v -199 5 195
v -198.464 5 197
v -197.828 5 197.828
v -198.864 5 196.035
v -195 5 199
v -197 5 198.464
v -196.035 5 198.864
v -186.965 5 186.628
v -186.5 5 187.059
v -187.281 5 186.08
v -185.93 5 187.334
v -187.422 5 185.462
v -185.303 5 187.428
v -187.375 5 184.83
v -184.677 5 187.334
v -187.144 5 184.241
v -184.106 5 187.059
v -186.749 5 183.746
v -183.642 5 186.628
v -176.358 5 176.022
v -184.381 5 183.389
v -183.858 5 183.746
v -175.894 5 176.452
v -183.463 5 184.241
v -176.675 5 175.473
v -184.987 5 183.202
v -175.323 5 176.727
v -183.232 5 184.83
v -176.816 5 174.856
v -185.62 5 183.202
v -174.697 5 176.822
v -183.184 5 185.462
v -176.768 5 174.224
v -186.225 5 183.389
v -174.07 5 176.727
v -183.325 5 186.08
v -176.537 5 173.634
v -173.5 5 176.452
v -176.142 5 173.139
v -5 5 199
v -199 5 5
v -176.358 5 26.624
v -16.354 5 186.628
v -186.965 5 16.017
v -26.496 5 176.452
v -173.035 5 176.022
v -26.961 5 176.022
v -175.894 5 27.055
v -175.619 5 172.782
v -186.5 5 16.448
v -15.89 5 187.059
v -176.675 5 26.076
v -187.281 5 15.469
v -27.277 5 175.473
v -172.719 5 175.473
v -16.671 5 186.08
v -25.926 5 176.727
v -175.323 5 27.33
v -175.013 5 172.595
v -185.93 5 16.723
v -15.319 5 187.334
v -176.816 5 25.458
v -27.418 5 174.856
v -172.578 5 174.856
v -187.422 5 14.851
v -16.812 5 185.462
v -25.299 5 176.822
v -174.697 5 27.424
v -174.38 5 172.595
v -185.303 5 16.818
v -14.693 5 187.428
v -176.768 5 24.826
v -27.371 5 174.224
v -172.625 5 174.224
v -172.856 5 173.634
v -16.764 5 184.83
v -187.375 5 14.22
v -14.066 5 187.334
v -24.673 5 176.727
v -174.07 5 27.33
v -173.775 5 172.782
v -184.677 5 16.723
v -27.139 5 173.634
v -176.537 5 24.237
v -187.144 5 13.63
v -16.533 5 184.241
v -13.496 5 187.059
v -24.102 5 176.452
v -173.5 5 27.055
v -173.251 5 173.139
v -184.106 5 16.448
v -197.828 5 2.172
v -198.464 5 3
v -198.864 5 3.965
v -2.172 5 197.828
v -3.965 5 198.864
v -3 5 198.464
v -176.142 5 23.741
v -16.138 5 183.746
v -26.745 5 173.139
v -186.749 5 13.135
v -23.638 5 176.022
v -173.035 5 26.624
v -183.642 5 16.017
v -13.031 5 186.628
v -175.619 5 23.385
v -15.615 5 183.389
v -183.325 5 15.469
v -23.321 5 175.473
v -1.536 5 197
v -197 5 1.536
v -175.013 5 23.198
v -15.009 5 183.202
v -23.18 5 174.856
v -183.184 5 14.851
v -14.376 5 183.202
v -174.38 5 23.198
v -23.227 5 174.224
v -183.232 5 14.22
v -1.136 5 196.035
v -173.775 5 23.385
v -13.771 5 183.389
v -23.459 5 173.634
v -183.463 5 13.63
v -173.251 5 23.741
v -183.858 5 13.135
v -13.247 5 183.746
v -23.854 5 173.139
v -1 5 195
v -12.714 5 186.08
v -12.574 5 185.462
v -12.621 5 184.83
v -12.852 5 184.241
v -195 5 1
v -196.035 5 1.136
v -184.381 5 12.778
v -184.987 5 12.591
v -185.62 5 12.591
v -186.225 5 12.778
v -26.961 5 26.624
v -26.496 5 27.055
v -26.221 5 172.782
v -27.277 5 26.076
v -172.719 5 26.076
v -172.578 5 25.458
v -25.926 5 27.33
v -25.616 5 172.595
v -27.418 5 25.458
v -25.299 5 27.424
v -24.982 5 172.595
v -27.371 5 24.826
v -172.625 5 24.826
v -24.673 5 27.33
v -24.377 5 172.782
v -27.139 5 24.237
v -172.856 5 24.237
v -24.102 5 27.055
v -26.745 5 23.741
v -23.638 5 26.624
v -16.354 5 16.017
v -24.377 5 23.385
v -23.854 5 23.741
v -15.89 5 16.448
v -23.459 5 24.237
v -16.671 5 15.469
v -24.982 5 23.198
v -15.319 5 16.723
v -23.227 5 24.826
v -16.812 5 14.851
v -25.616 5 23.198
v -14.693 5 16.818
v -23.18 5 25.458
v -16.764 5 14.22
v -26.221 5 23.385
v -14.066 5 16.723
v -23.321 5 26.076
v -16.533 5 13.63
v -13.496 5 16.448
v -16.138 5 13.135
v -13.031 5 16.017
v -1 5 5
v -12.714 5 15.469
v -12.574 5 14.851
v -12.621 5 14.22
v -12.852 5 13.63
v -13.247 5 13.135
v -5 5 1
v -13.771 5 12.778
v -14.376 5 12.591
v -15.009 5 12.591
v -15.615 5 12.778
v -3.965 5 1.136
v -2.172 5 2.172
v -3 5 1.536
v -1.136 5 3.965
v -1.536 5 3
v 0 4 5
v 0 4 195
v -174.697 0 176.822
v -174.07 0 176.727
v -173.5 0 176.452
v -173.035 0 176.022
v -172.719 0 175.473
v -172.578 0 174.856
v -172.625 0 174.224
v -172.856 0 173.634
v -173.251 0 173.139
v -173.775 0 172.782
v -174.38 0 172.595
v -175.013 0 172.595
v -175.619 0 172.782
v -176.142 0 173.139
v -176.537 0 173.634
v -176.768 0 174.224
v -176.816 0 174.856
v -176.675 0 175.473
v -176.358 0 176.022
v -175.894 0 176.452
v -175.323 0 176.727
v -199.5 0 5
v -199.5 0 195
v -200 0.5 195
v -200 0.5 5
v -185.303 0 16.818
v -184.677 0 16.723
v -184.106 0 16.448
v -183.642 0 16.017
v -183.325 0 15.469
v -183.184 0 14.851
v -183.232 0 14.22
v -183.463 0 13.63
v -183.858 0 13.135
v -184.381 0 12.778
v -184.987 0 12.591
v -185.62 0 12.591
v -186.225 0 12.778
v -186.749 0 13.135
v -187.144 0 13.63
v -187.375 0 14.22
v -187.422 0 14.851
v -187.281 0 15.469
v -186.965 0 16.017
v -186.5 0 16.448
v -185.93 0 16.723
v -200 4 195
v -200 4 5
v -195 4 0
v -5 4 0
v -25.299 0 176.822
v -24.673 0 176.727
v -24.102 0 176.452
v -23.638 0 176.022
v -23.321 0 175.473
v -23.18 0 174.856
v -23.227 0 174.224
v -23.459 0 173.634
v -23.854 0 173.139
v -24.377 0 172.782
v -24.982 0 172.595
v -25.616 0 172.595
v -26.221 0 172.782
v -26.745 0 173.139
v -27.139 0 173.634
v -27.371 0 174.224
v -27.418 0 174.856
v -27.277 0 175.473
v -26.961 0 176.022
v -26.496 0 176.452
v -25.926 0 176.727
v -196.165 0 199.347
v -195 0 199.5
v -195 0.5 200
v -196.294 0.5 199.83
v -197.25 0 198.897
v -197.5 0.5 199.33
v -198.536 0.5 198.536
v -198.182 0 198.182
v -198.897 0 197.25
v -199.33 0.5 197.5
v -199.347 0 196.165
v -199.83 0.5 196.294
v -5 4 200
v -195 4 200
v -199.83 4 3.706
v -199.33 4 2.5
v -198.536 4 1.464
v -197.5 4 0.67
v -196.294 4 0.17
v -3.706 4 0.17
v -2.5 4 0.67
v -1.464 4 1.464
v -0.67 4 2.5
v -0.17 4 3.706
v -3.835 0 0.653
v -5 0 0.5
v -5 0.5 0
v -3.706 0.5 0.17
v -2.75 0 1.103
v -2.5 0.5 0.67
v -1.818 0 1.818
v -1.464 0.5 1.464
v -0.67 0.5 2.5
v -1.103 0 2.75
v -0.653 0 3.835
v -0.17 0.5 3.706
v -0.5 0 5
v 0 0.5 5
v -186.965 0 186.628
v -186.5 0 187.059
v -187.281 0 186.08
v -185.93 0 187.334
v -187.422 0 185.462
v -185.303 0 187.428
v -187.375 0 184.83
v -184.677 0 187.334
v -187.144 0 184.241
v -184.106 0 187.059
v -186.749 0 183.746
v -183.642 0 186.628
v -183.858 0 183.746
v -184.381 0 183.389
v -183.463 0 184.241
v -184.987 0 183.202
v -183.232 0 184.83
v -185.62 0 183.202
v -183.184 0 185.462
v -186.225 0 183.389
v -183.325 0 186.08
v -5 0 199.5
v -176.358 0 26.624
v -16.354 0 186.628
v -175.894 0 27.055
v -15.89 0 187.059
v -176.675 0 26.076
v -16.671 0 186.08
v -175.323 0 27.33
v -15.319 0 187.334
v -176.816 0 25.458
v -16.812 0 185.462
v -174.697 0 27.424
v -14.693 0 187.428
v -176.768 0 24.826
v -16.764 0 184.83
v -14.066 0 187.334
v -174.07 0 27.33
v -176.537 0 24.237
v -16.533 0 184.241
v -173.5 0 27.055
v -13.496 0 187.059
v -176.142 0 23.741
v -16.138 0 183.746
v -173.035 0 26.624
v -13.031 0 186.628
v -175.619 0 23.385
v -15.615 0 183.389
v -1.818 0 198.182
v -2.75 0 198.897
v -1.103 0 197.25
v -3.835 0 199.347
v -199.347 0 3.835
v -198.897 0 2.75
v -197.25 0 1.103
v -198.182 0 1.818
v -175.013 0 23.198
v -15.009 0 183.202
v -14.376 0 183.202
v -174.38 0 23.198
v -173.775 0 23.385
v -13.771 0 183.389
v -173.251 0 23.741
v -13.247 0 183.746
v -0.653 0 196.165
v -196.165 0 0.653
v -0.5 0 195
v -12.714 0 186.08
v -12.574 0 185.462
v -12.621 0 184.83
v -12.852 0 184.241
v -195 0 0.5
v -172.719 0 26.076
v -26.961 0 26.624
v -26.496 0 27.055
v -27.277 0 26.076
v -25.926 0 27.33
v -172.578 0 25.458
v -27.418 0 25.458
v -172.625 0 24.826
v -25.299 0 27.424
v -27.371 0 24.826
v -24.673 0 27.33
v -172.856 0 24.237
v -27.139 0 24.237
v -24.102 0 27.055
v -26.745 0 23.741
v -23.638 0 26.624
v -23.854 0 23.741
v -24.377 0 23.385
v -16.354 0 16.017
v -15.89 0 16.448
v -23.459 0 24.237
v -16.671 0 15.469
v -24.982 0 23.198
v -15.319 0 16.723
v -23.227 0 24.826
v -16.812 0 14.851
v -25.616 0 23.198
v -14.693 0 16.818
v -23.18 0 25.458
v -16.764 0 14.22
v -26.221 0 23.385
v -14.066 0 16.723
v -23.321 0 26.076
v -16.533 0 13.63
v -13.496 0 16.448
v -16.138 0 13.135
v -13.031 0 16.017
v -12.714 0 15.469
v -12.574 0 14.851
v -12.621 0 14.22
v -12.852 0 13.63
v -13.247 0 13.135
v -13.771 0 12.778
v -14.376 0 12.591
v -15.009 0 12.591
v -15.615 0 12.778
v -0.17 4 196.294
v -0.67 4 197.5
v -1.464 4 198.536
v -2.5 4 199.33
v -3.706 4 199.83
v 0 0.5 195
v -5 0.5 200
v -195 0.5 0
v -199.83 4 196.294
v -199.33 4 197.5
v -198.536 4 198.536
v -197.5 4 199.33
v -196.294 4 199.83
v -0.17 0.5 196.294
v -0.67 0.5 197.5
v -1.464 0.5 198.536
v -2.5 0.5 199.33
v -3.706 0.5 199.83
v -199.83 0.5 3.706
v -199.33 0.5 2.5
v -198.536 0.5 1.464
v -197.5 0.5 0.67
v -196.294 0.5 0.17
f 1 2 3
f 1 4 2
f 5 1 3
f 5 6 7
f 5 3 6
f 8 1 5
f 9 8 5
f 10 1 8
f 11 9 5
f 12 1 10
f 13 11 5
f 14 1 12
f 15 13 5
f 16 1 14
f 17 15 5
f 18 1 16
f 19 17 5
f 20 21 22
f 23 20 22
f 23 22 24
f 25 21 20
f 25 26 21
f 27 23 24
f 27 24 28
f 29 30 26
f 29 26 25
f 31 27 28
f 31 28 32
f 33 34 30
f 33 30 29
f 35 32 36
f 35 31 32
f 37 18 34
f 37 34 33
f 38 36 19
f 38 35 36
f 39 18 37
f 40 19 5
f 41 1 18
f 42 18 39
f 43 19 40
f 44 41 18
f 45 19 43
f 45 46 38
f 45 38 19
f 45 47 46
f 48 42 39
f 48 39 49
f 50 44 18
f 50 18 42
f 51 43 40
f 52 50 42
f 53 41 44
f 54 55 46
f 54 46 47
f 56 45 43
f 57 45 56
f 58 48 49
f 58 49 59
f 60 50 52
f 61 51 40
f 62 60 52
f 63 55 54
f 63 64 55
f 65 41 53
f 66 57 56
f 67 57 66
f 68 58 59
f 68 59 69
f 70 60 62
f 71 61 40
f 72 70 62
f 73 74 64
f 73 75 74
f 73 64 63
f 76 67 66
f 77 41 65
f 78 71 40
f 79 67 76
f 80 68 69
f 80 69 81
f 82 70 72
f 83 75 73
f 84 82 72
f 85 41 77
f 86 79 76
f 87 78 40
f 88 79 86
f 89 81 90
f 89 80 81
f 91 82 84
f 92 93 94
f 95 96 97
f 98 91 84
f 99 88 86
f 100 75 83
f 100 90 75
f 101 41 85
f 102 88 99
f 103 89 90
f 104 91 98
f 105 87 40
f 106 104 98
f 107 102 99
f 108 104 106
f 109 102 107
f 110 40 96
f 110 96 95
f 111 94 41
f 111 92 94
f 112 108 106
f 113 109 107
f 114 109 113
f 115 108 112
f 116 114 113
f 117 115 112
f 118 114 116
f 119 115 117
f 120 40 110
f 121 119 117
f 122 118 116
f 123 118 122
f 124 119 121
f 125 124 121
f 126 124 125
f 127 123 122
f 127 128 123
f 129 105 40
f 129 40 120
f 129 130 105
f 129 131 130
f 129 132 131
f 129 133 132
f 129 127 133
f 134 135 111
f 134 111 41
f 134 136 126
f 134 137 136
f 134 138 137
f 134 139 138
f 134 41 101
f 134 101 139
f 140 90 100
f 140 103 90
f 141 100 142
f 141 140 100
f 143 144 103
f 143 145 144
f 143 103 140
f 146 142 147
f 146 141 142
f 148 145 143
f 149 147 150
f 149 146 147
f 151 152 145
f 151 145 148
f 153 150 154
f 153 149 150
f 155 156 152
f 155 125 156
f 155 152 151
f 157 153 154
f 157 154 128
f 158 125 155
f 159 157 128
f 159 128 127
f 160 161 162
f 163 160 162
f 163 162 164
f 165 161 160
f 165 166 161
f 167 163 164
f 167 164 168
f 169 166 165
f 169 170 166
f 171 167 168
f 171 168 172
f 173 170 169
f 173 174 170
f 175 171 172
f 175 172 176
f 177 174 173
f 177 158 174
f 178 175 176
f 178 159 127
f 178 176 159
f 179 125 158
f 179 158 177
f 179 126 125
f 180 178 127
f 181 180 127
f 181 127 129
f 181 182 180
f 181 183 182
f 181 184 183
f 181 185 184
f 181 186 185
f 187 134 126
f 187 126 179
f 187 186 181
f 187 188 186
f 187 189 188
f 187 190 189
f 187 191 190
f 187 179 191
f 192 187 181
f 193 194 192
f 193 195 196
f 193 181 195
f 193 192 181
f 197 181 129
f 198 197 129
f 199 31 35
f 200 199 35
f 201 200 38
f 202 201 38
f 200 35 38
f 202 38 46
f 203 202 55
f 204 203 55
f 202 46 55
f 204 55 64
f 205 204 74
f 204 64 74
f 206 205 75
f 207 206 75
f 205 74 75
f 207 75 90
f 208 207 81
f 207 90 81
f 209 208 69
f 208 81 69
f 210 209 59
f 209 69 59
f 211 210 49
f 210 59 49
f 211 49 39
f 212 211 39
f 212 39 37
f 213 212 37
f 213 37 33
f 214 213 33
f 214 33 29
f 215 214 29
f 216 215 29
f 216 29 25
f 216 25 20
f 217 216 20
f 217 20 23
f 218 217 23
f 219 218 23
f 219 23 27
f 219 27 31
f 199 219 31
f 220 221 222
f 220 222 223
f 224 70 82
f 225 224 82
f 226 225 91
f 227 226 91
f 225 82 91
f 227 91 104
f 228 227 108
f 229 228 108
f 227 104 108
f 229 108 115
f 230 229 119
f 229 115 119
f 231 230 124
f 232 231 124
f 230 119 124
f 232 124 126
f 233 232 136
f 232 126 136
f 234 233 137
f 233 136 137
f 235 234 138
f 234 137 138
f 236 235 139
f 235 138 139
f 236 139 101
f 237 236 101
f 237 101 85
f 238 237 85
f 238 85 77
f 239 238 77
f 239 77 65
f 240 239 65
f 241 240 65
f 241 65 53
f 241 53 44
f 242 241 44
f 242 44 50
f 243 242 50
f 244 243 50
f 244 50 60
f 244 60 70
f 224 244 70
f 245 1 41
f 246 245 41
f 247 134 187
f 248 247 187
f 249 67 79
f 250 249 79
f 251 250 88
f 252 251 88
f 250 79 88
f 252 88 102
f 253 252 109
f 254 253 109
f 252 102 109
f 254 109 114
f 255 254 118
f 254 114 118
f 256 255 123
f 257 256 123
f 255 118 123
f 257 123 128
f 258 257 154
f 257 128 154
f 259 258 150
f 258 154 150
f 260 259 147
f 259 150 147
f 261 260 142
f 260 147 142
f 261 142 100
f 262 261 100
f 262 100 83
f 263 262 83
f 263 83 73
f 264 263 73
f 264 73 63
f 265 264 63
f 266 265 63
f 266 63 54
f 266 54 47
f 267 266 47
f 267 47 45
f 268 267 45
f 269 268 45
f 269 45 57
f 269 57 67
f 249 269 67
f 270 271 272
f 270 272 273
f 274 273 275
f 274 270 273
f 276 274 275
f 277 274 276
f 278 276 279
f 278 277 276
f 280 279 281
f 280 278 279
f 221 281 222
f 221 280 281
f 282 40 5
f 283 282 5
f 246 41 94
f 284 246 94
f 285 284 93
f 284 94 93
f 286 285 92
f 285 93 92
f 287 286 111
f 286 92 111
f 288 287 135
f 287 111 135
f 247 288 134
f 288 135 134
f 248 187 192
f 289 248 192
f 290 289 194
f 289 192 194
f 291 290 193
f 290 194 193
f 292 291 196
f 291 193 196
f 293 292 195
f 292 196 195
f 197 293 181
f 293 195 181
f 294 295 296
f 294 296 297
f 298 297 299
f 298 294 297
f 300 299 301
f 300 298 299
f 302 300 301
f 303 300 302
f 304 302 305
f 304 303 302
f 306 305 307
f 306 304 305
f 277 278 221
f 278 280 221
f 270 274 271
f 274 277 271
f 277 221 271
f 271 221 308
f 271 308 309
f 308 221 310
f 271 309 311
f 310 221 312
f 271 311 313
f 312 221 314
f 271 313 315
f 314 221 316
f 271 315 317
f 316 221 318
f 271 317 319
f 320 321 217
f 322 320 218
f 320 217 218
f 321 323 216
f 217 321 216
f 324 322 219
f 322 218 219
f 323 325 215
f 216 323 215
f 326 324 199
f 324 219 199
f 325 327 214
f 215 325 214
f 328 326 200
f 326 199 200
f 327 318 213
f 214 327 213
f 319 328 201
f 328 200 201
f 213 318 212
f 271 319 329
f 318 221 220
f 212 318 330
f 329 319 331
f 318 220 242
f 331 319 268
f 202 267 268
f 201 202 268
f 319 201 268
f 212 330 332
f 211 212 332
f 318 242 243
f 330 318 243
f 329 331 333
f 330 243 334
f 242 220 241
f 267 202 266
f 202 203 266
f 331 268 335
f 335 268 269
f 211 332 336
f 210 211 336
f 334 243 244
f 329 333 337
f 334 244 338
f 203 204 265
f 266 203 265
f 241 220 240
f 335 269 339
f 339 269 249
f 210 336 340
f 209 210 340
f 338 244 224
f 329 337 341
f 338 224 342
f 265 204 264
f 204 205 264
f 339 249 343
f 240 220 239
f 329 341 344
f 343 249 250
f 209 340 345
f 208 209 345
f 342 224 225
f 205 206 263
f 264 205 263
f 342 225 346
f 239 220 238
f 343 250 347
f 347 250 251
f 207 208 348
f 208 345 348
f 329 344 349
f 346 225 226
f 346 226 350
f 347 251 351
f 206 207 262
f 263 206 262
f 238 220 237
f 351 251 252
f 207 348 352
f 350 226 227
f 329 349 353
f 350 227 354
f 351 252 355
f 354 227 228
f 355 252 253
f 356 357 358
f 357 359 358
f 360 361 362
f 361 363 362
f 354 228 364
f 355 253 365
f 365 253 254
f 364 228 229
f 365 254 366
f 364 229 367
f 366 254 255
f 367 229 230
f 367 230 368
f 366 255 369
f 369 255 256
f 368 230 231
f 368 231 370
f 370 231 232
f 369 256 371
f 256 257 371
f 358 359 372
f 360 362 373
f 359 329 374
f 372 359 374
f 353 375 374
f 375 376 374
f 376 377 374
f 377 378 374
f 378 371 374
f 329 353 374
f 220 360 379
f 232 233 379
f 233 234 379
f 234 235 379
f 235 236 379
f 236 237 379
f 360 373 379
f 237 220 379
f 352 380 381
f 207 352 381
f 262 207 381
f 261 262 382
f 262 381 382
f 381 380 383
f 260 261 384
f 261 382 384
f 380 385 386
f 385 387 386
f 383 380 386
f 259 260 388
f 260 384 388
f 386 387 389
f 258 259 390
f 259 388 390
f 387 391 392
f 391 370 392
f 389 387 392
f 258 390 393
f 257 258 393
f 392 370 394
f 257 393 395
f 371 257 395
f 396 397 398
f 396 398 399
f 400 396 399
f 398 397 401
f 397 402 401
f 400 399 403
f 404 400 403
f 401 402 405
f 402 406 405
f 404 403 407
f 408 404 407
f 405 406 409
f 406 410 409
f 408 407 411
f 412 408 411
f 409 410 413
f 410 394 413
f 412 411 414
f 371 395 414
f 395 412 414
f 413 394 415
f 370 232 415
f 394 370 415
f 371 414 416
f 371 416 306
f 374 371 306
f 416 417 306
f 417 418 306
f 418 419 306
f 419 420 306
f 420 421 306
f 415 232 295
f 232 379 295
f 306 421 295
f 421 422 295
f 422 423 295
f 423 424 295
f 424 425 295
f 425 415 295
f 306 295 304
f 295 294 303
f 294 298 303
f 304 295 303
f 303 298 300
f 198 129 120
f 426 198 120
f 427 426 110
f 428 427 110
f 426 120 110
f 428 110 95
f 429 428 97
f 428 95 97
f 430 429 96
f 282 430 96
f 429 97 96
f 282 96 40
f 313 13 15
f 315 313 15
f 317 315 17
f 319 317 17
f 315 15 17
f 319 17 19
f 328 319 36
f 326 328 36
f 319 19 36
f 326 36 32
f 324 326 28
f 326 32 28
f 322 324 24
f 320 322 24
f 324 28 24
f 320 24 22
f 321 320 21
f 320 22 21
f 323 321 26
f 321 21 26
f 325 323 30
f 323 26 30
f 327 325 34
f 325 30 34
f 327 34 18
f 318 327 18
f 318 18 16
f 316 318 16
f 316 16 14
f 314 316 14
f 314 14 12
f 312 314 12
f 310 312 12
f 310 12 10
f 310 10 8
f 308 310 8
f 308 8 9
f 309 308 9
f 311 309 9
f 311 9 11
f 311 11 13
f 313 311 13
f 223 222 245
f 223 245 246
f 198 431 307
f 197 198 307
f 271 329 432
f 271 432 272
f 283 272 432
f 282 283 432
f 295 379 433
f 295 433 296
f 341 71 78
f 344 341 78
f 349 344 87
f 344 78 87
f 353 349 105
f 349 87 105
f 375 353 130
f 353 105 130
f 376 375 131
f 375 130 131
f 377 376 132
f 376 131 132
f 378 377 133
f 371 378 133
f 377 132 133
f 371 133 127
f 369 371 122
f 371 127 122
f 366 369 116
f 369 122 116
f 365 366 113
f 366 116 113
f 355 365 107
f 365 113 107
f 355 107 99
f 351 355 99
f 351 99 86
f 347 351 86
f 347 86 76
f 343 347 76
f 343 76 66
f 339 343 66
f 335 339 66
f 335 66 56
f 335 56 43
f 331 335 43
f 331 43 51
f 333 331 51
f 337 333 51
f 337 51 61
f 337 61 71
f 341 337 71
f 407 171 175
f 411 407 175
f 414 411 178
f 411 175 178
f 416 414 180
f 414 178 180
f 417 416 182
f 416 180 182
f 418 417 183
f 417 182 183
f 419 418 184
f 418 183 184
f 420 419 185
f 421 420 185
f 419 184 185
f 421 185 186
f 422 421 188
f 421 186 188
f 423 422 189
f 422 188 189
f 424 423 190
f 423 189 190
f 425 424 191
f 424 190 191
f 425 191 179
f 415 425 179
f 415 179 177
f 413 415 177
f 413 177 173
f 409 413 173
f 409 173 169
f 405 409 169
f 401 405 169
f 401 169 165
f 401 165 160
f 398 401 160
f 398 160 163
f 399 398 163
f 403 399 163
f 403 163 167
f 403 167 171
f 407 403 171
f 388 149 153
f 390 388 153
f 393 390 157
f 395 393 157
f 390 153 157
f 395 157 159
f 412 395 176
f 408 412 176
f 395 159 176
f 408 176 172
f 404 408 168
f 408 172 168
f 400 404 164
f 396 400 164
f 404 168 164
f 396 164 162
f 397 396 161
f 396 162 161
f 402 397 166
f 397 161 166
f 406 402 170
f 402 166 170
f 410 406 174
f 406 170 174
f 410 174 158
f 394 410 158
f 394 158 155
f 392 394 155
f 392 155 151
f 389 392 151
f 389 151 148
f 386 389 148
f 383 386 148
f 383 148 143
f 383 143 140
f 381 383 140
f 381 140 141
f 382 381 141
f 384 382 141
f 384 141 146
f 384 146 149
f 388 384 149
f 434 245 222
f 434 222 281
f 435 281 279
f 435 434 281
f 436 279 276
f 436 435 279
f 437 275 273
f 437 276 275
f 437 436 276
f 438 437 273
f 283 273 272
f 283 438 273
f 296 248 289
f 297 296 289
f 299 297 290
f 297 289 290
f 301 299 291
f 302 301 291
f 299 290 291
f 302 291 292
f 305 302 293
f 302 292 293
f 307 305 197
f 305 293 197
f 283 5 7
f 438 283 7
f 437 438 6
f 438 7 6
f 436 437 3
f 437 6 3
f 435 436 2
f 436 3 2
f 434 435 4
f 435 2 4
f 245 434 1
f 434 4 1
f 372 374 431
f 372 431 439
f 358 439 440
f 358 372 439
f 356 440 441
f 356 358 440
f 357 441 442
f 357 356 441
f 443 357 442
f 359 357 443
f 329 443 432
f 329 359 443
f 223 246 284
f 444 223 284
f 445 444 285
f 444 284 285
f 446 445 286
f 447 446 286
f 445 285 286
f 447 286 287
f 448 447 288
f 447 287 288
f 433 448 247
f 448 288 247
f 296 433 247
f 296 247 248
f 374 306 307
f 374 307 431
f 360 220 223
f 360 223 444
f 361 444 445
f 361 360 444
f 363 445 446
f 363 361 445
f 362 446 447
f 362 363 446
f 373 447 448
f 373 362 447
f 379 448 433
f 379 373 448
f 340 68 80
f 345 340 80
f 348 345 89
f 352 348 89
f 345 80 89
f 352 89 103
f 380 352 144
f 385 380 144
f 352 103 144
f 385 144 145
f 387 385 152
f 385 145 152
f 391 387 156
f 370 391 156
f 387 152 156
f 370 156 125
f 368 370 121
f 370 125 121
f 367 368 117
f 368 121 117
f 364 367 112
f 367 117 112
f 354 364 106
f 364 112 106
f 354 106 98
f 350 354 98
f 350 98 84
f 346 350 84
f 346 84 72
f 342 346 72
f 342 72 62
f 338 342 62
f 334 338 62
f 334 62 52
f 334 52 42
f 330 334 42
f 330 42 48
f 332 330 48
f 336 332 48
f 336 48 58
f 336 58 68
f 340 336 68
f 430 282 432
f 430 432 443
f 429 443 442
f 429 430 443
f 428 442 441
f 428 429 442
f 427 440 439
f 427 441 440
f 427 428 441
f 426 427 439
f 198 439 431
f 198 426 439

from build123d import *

# Parameters (mm, degrees)
SKETCH1_W           = 200
SKETCH1_H           = 200
BOSS_EXTRUDE1_DEPTH = 5
SKETCH2_R           = 2.125
CUT_EXTRUDE1_DEPTH  = 283.886903196
FILLET1_R           = 5
CHAMFER1_SIZE       = 1
CHAMFER2_SIZE       = 0.5


with BuildPart() as part:
    # Sketch1 → Boss-Extrude1 (new body)
    with BuildSketch(Plane(origin=(0, 0, 0), x_dir=(1, 0, 0), z_dir=(0, 1, 0))):
        with Locations((-100, -100)):
            Rectangle(SKETCH1_W, SKETCH1_H)
    extrude(amount=BOSS_EXTRUDE1_DEPTH)

    # Sketch2 → Cut-Extrude1 (cut, through all)
    with BuildSketch(Plane(origin=(0, 5, 0), x_dir=(1, 0, 0), z_dir=(0, 1, 0))):
        with Locations(Location((-185.303300859, -185.303300859, 0), (0, 0, 270))):
            Circle(SKETCH2_R)
        with Locations(Location((-174.696699141, -174.696699141, 0), (0, 0, 270))):
            Circle(SKETCH2_R)
        with Locations(Location((-185.303300859, -14.692576694, 0), (0, 0, 270))):
            Circle(SKETCH2_R)
        with Locations(Location((-174.696699141, -25.299178412, 0), (0, 0, 270))):
            Circle(SKETCH2_R)
        with Locations(Location((-14.692576694, -14.692576694, 0), (0, 0, 270))):
            Circle(SKETCH2_R)
        with Locations(Location((-25.299178412, -25.299178412, 0), (0, 0, 270))):
            Circle(SKETCH2_R)
        with Locations(Location((-14.692576694, -185.303300859, 0), (0, 0, 270))):
            Circle(SKETCH2_R)
        with Locations(Location((-25.299178412, -174.696699141, 0), (0, 0, 270))):
            Circle(SKETCH2_R)
    extrude(amount=-CUT_EXTRUDE1_DEPTH, mode=Mode.SUBTRACT)

    # Fillet1
    fillet1_edges = [part.edges().sort_by_distance(p)[0] for p in [
        (0, 2.5, 200),
        (-200, 2.5, 200),
        (-200, 2.5, 0),
        (0, 2.5, 0),
    ]]
    fillet(fillet1_edges, radius=FILLET1_R)

    # Chamfer1
    chamfer1_edges = [part.edges().sort_by_distance(p)[0] for p in [
        (-200, 5, 100),
        (-100, 5, 0),
        (0, 5, 100),
        (-100, 5, 200),
        (-198.535533906, 5, 198.535533906),
        (-1.464466094, 5, 198.535533906),
        (-1.464466094, 5, 1.464466094),
        (-198.535533906, 5, 1.464466094),
    ]]
    chamfer(chamfer1_edges, length=CHAMFER1_SIZE)

    # Chamfer2
    chamfer2_edges = [part.edges().sort_by_distance(p)[0] for p in [
        (-200, 0, 100),
        (0, 0, 100),
        (-100, 0, 200),
        (-100, 0, 0),
        (-198.535533906, 0, 198.535533906),
        (-1.464466094, 0, 198.535533906),
        (-1.464466094, 0, 1.464466094),
        (-198.535533906, 0, 1.464466094),
    ]]
    chamfer(chamfer2_edges, length=CHAMFER2_SIZE)


solid = part.part
